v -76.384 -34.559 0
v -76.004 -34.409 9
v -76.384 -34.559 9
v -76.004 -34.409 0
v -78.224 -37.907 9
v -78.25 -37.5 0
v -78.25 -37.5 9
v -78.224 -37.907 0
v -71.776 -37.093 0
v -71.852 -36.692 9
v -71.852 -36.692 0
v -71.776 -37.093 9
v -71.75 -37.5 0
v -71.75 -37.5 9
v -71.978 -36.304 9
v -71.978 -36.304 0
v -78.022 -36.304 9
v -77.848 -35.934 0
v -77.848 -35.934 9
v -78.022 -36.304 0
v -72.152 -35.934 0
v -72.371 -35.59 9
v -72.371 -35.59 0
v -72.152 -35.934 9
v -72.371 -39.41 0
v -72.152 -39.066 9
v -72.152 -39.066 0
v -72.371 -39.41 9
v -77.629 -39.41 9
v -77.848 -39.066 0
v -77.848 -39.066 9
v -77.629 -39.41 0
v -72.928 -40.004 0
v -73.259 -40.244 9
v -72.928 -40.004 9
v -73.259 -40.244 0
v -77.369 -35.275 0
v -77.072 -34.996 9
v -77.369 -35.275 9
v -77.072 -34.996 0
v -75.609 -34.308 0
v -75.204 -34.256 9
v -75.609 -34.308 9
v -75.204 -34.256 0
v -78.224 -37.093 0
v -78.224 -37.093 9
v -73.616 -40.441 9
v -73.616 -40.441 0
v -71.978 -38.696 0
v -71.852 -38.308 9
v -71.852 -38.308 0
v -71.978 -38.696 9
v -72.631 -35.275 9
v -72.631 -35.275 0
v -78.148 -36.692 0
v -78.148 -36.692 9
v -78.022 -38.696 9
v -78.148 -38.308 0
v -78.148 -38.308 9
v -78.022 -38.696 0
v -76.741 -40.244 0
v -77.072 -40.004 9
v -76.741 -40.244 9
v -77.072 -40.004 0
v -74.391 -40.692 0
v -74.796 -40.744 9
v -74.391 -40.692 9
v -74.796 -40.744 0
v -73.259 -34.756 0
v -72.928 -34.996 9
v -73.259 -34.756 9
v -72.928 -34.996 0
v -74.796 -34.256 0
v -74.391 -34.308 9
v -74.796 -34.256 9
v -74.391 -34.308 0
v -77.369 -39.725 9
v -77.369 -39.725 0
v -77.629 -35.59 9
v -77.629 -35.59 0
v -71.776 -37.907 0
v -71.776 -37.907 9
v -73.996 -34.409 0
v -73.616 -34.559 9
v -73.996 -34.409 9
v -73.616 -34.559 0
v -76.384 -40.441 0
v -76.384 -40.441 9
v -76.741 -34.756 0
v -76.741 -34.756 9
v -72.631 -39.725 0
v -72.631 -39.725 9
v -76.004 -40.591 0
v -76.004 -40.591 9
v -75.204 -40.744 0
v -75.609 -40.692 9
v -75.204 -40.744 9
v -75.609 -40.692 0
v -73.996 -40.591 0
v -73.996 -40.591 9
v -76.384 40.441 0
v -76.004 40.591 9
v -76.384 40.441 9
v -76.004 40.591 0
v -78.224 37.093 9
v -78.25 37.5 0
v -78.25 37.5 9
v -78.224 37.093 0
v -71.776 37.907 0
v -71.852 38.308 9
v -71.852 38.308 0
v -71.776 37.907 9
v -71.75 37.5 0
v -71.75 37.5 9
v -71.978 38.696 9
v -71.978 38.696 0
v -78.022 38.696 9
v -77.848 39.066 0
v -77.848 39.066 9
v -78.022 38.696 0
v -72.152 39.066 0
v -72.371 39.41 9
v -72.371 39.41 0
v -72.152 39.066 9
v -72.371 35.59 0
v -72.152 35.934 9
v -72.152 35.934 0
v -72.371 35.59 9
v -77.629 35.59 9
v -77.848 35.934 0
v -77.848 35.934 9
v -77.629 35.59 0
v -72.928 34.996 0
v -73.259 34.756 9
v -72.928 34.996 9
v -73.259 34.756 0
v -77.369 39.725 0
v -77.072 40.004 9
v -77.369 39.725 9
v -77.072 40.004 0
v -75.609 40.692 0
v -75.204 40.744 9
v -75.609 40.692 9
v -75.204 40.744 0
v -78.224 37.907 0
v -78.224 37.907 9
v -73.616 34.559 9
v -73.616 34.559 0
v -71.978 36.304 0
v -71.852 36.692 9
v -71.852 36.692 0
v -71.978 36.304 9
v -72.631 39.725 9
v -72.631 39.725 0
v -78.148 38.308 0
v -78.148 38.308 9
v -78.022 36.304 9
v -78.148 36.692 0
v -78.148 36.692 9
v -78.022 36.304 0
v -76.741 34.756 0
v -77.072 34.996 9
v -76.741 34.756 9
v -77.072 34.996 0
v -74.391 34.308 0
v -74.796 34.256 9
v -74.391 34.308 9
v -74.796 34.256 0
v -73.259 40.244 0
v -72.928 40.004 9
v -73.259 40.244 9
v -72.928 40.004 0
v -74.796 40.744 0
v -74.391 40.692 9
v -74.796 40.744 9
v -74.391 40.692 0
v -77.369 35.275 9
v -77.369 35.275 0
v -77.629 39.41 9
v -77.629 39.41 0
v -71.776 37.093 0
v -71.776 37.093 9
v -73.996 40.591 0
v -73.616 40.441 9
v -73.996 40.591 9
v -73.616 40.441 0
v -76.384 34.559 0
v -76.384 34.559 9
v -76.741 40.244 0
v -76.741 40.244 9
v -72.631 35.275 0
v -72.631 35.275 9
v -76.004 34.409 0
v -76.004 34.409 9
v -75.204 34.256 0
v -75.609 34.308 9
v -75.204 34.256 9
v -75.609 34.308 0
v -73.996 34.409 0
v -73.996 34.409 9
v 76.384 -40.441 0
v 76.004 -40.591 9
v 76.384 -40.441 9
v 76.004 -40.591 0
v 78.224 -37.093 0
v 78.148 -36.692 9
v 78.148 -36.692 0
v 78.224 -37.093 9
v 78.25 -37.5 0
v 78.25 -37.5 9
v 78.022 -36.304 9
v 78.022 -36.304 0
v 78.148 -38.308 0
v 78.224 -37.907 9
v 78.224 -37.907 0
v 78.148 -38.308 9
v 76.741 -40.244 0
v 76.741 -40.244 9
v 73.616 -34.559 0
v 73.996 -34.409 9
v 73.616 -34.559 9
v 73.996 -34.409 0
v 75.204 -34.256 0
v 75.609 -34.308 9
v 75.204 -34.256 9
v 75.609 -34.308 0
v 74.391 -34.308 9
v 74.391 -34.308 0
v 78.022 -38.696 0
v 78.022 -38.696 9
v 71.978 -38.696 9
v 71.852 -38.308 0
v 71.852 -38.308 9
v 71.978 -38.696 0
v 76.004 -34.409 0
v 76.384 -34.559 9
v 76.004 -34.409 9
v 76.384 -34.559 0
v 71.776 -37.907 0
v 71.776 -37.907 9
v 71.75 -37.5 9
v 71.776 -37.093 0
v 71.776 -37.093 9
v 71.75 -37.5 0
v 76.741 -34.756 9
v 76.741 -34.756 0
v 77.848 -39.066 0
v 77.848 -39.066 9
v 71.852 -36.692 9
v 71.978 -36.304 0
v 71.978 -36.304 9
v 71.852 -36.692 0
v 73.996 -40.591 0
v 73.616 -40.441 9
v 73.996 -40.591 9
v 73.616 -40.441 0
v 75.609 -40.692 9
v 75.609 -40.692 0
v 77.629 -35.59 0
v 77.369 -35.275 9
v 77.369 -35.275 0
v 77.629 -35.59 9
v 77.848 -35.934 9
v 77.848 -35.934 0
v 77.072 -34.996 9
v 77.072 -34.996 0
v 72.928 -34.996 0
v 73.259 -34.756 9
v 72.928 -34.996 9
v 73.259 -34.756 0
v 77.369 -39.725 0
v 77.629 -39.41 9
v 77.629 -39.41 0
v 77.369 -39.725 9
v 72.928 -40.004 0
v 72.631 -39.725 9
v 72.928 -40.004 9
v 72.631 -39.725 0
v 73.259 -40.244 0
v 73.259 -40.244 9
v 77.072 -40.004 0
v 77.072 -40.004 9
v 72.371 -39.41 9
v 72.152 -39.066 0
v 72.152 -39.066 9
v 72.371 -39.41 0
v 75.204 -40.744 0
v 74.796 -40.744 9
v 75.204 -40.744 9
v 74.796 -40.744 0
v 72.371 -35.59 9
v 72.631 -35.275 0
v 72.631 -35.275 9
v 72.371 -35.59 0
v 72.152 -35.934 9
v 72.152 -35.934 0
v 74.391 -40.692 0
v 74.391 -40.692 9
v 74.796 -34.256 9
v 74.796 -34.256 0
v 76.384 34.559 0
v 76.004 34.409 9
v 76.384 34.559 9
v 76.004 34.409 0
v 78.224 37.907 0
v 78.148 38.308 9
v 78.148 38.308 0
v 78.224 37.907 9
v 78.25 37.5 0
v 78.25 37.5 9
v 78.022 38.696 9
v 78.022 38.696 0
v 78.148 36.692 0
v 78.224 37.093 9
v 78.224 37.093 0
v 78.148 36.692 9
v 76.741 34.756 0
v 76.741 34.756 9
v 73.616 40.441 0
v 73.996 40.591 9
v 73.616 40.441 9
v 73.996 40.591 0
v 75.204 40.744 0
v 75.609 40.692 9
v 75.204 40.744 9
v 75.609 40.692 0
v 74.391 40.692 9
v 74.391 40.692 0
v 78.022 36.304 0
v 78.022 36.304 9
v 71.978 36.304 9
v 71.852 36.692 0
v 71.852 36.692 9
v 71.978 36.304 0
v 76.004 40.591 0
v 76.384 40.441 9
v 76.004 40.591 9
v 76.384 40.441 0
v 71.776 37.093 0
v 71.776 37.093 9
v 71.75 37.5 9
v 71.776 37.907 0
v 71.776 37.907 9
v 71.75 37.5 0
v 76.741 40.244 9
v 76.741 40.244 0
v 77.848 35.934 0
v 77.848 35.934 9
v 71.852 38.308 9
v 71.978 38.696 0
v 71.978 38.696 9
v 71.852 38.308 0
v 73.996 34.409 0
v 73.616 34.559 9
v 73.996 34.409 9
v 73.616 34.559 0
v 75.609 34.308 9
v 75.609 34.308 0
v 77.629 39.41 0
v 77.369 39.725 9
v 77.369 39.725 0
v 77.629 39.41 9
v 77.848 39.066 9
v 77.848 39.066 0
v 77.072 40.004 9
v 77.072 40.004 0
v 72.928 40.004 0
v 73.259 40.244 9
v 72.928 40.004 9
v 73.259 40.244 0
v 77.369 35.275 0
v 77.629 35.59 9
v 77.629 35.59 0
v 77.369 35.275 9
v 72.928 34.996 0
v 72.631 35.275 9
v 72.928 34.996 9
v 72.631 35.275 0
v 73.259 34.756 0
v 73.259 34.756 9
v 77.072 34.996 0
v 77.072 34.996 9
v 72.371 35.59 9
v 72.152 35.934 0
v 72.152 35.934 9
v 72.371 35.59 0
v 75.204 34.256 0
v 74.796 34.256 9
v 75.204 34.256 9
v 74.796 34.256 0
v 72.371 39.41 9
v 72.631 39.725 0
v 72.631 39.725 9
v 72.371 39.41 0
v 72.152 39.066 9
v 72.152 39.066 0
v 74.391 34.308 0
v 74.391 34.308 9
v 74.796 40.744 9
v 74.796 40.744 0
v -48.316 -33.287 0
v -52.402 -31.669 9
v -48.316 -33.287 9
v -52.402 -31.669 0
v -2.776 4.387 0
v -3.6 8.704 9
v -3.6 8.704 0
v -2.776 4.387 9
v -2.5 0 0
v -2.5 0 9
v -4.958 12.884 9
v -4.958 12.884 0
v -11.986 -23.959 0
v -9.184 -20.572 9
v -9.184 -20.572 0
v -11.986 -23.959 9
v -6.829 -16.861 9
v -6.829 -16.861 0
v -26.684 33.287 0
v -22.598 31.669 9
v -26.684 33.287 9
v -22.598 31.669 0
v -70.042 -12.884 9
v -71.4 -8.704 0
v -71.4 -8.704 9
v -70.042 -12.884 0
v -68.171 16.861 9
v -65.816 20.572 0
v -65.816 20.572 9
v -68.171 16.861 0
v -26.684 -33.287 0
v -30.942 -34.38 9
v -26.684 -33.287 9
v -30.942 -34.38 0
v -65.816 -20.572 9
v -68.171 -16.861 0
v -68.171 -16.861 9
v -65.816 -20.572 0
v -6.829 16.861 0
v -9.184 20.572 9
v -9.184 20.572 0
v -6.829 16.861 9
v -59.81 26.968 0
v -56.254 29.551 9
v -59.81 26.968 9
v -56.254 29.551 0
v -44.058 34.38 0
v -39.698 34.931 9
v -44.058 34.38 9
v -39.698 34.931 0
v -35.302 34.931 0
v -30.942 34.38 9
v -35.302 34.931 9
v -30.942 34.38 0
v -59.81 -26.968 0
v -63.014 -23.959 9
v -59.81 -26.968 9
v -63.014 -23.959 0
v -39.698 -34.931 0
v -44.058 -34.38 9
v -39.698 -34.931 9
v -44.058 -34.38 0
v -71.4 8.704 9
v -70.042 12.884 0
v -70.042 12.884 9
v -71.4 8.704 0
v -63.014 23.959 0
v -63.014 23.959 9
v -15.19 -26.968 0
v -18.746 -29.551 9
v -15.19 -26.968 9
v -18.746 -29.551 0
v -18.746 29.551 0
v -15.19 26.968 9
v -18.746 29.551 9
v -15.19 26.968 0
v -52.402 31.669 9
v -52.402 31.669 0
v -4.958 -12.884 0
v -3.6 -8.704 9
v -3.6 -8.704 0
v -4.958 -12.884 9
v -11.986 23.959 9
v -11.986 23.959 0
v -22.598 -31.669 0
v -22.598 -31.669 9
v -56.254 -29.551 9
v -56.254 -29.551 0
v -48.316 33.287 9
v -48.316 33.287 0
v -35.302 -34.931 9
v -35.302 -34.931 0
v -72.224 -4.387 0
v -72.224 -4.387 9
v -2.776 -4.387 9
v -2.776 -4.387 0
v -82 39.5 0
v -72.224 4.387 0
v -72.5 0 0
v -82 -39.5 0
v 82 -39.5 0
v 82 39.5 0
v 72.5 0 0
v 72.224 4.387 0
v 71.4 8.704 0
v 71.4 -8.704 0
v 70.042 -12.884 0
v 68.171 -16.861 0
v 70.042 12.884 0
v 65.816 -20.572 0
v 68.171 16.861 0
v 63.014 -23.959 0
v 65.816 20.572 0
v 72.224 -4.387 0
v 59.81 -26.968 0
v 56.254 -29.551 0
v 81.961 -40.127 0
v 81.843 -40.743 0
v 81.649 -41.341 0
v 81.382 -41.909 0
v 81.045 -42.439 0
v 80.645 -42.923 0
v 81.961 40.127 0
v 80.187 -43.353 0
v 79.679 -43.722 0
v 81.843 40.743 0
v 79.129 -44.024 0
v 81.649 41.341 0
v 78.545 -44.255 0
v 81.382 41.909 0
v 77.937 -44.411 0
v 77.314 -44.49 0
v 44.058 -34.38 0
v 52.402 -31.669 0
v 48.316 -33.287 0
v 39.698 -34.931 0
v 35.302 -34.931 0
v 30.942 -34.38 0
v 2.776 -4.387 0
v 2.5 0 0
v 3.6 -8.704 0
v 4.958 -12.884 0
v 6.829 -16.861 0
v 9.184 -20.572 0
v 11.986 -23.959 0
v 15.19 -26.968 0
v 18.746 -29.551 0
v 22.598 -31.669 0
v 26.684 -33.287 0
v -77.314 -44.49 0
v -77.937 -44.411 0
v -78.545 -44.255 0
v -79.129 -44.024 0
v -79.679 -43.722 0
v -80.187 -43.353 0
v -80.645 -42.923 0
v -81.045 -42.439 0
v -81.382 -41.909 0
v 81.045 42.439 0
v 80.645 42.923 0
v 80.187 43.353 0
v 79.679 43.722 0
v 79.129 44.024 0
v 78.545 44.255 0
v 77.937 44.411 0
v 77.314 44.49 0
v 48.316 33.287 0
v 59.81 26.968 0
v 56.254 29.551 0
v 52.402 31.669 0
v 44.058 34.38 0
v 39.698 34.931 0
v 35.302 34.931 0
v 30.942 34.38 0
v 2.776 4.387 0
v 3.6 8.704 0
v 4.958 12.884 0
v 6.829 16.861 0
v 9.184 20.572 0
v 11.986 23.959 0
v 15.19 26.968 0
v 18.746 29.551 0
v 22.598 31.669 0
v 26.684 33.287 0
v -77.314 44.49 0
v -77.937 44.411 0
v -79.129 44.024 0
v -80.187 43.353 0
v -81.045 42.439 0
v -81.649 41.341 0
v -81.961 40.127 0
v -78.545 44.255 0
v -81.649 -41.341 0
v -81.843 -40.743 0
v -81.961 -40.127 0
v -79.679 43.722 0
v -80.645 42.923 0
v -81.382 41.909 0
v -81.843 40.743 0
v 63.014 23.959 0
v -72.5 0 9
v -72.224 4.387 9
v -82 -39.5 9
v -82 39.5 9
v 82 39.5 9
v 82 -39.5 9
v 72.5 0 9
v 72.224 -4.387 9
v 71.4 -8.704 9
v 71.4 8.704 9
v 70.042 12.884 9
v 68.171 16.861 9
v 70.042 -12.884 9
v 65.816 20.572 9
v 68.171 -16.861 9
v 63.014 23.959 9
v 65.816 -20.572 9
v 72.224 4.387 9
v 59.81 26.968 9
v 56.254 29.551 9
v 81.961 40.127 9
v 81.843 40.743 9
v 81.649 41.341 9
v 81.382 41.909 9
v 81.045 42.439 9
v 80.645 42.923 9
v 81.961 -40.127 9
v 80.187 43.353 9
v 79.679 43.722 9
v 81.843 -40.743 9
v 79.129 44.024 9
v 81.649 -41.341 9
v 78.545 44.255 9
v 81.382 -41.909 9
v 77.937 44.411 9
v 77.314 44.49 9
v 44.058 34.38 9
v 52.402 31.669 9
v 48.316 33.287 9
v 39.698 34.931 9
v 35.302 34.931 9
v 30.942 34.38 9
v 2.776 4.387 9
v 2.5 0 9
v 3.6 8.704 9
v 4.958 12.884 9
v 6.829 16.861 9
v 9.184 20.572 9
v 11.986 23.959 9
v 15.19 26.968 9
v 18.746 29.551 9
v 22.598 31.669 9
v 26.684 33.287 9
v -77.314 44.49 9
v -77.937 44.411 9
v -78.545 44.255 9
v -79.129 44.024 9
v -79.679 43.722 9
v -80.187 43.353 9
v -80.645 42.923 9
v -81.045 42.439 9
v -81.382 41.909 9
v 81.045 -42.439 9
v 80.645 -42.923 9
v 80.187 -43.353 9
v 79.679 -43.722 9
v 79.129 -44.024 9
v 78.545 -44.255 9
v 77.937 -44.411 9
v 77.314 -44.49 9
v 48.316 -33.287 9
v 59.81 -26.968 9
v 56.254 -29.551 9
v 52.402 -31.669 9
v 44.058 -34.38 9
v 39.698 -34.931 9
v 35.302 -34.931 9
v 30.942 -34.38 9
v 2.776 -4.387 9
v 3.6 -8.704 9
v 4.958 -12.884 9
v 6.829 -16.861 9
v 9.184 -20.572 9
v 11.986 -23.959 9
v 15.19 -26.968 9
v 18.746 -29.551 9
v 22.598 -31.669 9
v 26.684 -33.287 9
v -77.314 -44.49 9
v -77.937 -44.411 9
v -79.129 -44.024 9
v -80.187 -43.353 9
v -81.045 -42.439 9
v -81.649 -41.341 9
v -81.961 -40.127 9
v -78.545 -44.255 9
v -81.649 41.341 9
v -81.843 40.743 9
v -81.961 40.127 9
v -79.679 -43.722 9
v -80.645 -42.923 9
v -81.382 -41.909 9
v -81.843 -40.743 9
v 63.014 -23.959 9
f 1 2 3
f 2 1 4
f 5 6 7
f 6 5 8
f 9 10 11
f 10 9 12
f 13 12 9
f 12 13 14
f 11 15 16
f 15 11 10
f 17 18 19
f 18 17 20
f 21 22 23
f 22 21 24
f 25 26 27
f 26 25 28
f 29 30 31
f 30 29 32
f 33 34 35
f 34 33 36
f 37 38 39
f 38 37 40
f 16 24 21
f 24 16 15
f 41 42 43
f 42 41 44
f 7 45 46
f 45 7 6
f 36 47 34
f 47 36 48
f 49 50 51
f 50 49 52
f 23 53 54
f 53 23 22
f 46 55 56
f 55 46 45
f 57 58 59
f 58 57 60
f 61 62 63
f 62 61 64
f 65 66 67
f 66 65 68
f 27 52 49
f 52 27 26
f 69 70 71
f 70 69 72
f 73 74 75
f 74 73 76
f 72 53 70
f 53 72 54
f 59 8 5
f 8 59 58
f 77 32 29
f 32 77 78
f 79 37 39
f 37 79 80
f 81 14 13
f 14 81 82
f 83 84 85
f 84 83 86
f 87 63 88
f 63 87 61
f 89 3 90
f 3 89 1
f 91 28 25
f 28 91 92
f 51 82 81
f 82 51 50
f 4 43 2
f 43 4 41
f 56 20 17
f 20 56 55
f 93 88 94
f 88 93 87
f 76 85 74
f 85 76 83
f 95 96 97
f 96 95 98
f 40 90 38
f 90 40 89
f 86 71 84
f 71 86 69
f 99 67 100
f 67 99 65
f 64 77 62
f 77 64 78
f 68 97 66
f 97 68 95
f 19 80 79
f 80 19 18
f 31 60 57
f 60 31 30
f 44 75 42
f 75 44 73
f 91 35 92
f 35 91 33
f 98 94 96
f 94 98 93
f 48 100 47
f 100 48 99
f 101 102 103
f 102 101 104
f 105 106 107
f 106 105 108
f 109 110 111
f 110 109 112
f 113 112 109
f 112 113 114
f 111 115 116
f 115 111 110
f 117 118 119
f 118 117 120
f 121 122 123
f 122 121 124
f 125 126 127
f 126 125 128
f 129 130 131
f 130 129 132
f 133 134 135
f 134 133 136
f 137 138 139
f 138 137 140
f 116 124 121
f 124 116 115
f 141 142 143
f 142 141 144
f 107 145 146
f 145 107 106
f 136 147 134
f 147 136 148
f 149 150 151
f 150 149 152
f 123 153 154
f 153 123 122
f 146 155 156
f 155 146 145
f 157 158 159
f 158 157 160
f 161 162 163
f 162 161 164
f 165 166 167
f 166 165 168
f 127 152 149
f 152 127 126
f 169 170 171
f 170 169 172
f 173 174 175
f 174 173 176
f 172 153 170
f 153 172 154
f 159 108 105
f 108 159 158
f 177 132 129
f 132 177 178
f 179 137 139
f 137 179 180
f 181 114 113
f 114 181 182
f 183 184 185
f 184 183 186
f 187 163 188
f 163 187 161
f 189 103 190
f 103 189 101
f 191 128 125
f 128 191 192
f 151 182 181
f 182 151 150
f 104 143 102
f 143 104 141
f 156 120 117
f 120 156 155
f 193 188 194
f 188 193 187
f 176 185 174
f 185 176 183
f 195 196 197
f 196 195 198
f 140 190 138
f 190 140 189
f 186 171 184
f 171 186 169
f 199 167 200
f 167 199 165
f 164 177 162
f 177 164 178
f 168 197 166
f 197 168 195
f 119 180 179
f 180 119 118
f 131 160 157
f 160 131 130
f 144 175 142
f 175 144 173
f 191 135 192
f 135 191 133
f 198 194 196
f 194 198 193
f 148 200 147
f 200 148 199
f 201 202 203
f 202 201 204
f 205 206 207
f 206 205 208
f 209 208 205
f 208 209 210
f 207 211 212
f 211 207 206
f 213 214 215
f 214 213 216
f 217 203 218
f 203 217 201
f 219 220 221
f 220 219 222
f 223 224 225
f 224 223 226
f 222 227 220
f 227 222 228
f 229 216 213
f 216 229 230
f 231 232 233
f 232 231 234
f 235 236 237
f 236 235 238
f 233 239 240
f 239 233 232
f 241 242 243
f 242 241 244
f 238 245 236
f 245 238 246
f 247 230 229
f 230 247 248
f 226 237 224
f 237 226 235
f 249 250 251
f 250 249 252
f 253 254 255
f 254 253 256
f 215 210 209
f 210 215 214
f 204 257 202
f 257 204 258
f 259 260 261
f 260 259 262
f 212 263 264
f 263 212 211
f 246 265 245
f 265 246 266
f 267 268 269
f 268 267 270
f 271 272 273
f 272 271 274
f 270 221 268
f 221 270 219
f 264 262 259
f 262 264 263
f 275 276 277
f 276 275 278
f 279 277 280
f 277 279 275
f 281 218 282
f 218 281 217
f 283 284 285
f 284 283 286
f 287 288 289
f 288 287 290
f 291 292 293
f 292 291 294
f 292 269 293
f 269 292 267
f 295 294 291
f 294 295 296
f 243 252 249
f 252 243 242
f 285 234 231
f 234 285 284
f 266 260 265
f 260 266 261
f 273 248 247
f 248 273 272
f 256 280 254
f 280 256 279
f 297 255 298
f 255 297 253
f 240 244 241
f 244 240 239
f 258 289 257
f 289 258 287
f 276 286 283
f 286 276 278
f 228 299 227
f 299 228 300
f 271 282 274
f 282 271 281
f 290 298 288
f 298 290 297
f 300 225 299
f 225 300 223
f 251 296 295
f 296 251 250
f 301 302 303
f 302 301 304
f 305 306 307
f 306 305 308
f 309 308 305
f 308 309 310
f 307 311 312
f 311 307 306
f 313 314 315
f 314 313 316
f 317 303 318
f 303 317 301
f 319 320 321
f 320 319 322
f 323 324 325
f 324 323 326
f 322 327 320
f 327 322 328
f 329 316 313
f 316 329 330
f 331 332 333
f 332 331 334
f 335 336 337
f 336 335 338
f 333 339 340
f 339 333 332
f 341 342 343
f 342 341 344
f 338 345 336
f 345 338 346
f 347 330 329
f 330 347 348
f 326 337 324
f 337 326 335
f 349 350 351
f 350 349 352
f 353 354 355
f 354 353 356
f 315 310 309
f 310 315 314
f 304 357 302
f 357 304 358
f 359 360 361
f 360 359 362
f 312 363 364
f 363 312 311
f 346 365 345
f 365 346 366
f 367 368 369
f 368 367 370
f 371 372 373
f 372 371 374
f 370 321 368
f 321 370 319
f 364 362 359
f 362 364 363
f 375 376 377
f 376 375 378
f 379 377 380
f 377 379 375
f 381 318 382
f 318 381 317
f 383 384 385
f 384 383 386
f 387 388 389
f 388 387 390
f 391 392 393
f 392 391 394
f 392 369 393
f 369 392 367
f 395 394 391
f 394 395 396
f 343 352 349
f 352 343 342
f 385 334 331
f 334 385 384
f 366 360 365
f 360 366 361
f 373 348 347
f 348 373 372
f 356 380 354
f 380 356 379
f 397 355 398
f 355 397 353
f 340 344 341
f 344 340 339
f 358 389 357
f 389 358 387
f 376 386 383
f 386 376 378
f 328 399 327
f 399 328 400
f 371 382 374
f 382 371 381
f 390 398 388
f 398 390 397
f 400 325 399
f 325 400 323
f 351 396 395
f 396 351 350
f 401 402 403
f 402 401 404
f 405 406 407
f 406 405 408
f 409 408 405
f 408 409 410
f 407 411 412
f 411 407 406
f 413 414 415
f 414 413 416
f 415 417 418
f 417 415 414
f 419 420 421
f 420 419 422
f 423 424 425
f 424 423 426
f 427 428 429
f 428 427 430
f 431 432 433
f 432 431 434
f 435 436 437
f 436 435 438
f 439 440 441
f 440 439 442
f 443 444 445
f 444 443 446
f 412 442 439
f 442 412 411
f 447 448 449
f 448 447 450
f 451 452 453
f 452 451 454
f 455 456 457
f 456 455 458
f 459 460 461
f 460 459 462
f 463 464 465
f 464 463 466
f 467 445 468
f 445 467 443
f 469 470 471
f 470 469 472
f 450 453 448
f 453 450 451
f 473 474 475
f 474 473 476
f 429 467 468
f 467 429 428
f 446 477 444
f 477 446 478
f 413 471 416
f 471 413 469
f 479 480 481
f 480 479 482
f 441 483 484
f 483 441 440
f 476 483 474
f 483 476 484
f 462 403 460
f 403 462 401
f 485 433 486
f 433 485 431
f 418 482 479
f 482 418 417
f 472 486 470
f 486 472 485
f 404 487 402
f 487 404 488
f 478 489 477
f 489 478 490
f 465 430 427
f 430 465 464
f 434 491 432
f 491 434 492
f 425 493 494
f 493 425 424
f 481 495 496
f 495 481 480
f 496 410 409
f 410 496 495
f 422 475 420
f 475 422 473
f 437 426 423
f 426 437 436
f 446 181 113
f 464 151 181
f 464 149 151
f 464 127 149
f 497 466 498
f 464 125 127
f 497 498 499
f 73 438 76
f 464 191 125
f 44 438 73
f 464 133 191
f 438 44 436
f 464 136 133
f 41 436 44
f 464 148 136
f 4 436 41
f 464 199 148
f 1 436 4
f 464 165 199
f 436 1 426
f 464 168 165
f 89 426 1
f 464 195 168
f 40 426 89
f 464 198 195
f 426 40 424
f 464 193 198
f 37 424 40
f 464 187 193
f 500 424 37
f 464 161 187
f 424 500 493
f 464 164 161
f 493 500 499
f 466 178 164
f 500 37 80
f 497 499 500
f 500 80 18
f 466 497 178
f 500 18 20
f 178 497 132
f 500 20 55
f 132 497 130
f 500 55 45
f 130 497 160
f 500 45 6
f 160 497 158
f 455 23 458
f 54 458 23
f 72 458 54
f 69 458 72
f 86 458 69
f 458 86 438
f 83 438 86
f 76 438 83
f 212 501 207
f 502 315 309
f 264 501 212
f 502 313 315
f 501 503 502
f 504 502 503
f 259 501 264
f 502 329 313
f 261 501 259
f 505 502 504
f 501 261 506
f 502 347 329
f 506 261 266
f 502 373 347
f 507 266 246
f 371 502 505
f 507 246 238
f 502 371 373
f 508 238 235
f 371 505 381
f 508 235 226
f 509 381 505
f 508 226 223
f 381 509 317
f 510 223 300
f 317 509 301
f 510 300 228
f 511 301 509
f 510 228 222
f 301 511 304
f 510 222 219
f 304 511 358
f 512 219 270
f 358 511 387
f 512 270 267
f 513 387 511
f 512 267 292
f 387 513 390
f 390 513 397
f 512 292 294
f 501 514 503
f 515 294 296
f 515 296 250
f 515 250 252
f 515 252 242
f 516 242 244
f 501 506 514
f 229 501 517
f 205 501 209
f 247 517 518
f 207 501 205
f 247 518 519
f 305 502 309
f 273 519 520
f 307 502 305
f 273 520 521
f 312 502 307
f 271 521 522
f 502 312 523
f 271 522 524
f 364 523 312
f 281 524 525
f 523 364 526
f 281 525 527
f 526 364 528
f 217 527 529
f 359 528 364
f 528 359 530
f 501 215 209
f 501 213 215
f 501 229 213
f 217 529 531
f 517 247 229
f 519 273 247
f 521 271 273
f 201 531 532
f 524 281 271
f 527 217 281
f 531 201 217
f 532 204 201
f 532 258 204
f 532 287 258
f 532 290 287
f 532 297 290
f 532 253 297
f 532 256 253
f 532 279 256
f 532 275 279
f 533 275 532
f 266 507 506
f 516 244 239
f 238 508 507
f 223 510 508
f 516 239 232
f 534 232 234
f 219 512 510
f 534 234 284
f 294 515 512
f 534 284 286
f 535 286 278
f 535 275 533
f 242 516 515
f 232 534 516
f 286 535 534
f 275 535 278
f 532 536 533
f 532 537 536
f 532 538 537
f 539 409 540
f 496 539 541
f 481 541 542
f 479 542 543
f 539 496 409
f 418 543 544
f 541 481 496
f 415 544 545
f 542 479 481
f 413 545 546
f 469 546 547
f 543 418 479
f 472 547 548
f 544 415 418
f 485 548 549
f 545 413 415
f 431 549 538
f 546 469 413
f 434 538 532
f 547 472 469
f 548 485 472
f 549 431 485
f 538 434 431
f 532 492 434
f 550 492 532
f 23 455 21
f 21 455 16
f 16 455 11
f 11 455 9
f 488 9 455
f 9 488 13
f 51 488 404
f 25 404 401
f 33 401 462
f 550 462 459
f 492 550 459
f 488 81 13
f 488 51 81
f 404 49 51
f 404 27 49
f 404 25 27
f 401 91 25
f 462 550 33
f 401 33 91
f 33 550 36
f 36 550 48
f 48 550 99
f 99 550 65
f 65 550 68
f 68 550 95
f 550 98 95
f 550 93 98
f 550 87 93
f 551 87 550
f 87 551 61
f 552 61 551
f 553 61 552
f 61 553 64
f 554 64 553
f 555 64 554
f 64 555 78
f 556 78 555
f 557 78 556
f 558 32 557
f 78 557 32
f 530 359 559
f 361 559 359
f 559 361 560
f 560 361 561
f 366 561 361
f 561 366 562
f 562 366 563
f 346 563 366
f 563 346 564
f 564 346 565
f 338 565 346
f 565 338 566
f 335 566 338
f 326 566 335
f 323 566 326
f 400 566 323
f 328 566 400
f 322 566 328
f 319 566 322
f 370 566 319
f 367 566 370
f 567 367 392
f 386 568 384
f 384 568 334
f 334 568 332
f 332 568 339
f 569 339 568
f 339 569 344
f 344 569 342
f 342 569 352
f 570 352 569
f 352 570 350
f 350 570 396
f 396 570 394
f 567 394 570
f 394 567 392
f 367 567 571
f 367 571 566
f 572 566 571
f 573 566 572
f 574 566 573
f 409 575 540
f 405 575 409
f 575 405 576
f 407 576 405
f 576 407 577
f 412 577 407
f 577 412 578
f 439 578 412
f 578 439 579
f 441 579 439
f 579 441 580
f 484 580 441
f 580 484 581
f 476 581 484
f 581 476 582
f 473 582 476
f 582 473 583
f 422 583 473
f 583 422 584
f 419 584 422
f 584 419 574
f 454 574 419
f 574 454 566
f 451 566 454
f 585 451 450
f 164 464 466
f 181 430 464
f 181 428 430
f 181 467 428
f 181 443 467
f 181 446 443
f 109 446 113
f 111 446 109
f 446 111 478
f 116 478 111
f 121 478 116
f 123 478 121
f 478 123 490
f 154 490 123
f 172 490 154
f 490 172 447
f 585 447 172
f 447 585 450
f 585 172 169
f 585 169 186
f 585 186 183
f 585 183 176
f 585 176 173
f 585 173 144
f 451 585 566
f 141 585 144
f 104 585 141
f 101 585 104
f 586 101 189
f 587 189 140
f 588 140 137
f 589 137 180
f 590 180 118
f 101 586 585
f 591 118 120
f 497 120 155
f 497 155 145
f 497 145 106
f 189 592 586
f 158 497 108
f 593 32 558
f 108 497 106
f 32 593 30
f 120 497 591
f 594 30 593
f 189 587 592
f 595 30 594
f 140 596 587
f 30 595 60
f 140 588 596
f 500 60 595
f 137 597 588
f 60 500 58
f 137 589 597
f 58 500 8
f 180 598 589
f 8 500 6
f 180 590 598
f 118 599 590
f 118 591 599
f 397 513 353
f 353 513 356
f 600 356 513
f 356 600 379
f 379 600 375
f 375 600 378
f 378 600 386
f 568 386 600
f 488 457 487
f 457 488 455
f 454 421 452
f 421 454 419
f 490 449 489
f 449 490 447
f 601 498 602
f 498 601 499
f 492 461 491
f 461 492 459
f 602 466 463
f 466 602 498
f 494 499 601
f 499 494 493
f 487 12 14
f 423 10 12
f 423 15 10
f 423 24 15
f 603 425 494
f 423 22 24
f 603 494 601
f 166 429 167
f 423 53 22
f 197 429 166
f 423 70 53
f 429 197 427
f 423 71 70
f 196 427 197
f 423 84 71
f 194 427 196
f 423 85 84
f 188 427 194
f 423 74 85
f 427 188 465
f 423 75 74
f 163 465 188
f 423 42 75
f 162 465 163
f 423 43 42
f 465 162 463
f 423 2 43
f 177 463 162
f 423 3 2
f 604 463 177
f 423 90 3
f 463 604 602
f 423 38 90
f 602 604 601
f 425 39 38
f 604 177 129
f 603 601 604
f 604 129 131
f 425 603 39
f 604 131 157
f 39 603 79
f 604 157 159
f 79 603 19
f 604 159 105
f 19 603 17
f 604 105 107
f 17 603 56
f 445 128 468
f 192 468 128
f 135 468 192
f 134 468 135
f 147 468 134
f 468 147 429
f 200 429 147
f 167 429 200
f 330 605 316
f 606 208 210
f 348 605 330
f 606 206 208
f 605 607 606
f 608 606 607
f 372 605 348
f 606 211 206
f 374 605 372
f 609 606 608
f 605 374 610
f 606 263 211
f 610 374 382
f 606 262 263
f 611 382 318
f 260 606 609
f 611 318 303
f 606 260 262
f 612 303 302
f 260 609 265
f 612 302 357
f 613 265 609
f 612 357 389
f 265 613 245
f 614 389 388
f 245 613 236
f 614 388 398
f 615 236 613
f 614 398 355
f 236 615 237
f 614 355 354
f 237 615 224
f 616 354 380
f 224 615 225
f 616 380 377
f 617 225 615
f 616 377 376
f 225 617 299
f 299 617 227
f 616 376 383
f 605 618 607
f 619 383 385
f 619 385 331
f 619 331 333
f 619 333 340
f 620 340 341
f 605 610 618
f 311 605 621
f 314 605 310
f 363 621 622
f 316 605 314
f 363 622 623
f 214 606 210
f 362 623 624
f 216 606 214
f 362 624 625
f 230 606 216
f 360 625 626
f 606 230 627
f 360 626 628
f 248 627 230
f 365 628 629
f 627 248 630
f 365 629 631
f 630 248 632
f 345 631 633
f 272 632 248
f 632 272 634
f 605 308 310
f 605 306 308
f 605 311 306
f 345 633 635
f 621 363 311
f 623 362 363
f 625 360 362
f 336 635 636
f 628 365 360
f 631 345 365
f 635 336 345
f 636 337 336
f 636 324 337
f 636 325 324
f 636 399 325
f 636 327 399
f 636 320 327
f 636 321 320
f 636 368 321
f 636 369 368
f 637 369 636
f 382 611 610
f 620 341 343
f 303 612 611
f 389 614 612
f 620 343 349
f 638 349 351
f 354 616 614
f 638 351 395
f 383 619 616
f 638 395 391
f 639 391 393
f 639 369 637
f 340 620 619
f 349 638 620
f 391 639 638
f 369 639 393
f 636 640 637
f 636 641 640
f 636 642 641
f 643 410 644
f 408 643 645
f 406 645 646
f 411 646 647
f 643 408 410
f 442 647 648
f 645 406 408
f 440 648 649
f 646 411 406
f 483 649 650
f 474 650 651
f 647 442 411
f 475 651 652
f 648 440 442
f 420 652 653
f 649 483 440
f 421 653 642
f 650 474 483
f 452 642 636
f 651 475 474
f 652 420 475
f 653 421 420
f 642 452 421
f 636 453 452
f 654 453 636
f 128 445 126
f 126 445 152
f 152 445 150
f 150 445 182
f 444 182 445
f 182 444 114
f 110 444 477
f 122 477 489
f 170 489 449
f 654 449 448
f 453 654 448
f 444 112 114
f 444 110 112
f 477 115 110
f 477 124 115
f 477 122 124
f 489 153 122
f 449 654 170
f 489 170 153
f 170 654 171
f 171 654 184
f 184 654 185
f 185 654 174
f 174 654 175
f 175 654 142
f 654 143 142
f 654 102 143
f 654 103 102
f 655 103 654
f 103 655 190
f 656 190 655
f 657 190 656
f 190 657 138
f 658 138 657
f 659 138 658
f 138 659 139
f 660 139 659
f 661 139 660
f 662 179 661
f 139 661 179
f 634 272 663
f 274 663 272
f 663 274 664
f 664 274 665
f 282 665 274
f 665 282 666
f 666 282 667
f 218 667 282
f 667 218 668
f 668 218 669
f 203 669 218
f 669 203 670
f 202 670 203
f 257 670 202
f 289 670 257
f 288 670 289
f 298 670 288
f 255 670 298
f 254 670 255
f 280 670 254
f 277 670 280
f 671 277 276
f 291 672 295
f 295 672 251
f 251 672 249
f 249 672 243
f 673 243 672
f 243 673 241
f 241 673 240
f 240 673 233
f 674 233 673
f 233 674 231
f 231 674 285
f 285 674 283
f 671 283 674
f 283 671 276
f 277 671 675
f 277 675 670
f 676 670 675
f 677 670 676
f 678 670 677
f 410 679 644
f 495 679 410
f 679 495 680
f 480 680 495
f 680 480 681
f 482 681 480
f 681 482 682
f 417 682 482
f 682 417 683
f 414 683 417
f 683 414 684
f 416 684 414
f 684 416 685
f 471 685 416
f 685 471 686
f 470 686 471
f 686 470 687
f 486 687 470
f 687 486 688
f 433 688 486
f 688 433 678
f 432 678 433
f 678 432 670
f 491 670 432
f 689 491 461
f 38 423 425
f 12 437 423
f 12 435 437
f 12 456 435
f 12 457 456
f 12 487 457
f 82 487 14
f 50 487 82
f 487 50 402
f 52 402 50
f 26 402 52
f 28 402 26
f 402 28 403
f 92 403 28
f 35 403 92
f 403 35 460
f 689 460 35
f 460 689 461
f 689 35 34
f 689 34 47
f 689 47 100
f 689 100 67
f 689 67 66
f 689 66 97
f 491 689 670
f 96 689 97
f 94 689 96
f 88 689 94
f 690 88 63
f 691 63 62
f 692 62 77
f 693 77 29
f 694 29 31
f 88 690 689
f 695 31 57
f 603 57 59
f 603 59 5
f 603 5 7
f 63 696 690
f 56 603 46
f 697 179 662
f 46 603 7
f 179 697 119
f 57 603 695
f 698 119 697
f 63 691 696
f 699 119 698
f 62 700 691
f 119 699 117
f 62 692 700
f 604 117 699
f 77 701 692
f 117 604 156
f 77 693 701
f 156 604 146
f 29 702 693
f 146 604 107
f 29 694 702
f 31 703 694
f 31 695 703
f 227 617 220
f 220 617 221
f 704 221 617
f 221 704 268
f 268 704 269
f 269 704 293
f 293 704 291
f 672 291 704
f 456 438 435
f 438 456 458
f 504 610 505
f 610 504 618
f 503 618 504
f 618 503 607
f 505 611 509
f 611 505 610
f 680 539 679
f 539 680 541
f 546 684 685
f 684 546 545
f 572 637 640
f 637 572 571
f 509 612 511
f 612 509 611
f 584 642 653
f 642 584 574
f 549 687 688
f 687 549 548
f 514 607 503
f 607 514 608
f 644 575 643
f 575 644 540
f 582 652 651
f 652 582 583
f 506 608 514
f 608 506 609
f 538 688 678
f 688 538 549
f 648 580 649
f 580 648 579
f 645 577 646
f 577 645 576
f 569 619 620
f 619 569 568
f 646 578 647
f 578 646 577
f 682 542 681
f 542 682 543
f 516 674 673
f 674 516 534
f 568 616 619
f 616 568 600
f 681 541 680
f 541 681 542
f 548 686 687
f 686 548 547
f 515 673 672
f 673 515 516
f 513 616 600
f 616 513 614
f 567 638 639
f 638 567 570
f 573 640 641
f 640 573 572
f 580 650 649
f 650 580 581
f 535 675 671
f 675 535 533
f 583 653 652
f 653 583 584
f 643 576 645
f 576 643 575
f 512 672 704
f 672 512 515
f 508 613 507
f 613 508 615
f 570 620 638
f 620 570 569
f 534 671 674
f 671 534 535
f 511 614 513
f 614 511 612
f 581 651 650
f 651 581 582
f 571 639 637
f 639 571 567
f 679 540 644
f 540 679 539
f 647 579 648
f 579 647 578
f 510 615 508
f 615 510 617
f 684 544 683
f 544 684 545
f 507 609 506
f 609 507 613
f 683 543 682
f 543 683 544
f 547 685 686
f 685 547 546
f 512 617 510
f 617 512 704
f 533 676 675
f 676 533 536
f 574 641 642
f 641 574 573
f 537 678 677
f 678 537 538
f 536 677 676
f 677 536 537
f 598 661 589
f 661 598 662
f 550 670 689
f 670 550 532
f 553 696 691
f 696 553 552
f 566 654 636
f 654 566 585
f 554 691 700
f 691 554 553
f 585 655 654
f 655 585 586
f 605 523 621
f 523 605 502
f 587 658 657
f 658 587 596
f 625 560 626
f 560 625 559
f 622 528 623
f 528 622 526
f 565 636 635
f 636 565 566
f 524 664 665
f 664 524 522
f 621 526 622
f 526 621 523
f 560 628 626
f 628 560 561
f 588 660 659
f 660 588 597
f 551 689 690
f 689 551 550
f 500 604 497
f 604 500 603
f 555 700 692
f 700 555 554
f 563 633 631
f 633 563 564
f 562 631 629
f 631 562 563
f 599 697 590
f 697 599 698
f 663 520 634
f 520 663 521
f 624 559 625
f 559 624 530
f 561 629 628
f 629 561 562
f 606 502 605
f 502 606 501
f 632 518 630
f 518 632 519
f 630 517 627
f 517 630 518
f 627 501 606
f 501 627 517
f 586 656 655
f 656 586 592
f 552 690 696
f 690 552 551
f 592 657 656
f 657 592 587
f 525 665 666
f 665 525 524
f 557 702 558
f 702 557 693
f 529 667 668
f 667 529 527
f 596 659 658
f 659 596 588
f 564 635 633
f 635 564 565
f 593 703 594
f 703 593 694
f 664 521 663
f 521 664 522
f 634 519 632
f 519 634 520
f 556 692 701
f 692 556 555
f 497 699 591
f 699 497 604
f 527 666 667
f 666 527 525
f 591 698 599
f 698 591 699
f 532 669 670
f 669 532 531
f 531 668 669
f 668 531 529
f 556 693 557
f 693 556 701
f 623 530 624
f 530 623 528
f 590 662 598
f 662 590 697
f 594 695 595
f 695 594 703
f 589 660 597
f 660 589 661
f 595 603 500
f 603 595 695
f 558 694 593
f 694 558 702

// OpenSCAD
$fn = 50;


difference() {
	union() {
		hull() {
			translate(v = [-77.0000000000, 39.5000000000, 0]) {
				cylinder(h = 9, r = 5);
			}
			translate(v = [77.0000000000, 39.5000000000, 0]) {
				cylinder(h = 9, r = 5);
			}
			translate(v = [-77.0000000000, -39.5000000000, 0]) {
				cylinder(h = 9, r = 5);
			}
			translate(v = [77.0000000000, -39.5000000000, 0]) {
				cylinder(h = 9, r = 5);
			}
		}
	}
	union() {
		#translate(v = [-75.0000000000, -37.5000000000, -100.0000000000]) {
			cylinder(h = 200, r = 3.2500000000);
		}
		#translate(v = [-75.0000000000, 37.5000000000, -100.0000000000]) {
			cylinder(h = 200, r = 3.2500000000);
		}
		#translate(v = [75.0000000000, -37.5000000000, -100.0000000000]) {
			cylinder(h = 200, r = 3.2500000000);
		}
		#translate(v = [75.0000000000, 37.5000000000, -100.0000000000]) {
			cylinder(h = 200, r = 3.2500000000);
		}
		#translate(v = [-37.5000000000, 0, 0]) {
			cylinder(h = 9, r = 35.0000000000);
		}
		#translate(v = [37.5000000000, 0, 0]) {
			cylinder(h = 9, r = 35.0000000000);
		}
	}
}
